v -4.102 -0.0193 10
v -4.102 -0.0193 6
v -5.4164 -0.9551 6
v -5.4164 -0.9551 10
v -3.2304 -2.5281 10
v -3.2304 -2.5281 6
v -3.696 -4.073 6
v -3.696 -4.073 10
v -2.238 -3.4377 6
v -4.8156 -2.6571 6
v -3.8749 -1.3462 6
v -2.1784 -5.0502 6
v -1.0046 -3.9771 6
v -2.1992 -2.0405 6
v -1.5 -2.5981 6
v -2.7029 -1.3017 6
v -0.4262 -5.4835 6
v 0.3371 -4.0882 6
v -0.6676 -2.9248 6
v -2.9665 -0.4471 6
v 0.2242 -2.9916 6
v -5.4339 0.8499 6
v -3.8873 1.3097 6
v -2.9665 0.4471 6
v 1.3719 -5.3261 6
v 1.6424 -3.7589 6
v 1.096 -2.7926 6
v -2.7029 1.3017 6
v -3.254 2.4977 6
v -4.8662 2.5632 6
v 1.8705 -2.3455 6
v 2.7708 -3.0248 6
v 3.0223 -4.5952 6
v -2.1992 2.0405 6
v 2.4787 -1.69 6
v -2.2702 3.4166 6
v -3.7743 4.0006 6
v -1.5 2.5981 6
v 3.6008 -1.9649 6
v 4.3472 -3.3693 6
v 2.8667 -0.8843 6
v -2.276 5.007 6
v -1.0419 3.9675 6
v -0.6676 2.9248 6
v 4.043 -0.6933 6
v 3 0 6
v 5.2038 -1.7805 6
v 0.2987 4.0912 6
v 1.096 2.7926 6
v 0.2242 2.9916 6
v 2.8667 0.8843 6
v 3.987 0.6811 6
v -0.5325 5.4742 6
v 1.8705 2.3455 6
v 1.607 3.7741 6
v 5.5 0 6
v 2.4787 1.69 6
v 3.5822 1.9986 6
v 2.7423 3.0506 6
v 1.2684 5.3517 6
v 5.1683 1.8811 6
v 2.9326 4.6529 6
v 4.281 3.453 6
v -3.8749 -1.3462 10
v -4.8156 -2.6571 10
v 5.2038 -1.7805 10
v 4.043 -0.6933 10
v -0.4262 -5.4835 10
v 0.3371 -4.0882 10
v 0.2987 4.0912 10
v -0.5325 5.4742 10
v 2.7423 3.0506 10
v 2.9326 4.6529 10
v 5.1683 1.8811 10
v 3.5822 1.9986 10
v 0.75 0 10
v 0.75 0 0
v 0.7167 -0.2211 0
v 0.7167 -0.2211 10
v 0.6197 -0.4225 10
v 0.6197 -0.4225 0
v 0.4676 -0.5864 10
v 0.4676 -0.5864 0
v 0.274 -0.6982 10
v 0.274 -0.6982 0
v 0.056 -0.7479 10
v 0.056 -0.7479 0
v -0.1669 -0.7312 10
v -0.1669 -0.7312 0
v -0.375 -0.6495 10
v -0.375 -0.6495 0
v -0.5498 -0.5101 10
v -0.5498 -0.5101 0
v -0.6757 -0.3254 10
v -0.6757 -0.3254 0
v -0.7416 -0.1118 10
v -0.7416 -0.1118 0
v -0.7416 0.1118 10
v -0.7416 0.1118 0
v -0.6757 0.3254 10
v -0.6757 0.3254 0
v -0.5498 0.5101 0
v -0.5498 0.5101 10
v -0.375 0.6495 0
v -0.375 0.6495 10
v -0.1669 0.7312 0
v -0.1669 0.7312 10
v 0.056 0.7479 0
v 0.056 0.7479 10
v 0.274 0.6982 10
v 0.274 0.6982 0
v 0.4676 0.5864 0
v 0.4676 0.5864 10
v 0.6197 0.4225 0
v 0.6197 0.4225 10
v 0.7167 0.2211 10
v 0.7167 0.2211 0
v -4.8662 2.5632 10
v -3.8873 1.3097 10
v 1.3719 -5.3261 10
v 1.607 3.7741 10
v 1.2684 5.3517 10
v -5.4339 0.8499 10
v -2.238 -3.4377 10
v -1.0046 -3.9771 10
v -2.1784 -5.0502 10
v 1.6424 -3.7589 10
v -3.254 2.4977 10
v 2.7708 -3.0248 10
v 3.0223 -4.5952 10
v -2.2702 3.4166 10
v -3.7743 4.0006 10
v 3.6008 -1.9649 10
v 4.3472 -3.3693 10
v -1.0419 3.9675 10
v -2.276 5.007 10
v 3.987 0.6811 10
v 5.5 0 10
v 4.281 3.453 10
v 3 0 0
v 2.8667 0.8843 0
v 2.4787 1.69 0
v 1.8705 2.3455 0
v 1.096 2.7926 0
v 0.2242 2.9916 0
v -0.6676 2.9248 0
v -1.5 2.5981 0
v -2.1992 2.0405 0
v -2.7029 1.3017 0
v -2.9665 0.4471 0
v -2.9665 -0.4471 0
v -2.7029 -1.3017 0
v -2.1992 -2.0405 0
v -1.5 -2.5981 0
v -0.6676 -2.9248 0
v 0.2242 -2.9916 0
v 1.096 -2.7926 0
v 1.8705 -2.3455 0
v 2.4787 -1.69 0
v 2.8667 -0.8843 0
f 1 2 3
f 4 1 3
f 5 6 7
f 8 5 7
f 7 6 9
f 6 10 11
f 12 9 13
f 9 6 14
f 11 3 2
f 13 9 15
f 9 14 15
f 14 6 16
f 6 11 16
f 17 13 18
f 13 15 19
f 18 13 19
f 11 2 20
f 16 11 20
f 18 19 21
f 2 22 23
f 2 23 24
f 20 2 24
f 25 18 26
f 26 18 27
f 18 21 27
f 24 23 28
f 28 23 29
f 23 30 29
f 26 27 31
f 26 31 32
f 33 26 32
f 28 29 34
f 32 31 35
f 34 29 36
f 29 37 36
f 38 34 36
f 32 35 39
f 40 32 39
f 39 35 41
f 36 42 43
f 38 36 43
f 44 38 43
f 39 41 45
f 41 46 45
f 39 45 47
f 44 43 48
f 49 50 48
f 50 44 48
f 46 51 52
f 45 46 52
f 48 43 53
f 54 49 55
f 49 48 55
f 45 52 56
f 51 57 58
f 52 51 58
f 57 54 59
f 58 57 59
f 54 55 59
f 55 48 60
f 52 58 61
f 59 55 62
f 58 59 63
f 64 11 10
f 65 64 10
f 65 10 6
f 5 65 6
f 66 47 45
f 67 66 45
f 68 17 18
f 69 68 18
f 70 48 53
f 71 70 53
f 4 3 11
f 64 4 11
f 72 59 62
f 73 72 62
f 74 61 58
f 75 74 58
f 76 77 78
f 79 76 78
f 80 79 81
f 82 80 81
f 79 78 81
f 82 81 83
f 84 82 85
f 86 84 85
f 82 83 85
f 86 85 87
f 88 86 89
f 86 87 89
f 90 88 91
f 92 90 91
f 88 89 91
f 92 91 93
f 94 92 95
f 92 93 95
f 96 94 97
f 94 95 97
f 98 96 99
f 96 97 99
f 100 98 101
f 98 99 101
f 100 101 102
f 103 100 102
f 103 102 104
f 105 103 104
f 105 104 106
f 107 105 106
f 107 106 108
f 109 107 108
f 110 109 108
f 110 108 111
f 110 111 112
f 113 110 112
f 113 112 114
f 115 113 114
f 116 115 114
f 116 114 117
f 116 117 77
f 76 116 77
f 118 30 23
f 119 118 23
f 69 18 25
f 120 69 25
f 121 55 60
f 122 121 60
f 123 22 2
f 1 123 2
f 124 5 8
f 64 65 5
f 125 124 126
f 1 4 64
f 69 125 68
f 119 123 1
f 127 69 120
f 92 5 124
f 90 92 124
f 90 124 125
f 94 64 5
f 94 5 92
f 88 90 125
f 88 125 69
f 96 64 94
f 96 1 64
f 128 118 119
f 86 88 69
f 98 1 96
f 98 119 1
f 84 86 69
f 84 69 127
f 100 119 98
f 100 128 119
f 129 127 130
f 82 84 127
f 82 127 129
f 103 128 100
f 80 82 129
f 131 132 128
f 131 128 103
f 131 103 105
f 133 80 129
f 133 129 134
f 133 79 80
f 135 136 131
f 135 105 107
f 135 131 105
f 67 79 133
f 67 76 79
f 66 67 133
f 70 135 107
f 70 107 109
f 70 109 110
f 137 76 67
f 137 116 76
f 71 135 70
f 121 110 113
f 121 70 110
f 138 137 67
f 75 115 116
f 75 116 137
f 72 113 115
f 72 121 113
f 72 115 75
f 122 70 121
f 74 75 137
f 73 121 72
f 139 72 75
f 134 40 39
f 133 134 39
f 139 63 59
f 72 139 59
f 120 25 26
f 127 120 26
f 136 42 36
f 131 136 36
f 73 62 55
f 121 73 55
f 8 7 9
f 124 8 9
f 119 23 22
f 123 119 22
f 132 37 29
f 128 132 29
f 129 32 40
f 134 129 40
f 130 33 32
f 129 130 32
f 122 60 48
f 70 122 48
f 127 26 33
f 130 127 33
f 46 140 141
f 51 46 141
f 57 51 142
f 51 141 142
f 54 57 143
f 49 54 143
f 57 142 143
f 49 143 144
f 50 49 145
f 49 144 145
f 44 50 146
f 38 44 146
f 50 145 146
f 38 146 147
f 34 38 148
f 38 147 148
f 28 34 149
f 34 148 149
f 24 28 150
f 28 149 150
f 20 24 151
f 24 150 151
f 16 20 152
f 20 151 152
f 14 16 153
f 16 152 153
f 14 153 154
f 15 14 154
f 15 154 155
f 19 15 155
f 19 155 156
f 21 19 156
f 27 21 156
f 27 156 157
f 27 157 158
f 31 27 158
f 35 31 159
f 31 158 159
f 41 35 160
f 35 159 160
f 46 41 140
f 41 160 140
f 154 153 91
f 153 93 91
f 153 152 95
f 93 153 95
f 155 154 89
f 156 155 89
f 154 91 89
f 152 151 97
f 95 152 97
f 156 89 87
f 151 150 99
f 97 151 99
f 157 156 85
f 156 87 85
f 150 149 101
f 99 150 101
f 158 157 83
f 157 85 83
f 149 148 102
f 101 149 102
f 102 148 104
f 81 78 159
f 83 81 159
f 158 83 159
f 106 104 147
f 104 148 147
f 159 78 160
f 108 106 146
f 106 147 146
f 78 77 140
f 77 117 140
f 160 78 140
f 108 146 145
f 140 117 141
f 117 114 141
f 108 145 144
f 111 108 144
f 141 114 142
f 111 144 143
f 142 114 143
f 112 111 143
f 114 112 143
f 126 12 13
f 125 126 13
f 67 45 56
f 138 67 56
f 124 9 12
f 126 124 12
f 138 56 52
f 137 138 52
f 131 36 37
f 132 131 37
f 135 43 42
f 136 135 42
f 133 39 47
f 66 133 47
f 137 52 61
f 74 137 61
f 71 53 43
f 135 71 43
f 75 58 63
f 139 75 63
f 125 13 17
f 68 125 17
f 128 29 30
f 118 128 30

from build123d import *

# Parameters (mm, degrees)
F0_R     = 3
F1_DEPTH = 6
F2_R     = 3
F3_DEPTH = 4
F4_R     = 0.75
F5_DEPTH = 25.4


with BuildPart() as f1:
    # F0 (on Top) → F1 (new body)
    with BuildSketch(Plane.XY):
        Circle(F0_R)
    extrude(amount=F1_DEPTH)

    # F2 (on face) → F3 (join)
    with BuildSketch(Plane.XY.offset(6)):
        Polygon((4.04302, -0.693343), (5.5, 0), (3.986969, 0.681121), (5.168309, 1.881111), (3.582234, 1.998583), (4.281007, 3.452967), (2.742315, 3.050646), (2.932624, 4.652925), (1.607039, 3.774144), (1.268387, 5.351747), (0.298678, 4.091152), (-0.53246, 5.474165), (-1.041851, 3.967528), (-2.275959, 5.006996), (-2.270169, 3.416587), (-3.774329, 4.000555), (-3.253981, 2.497667), (-4.86619, 2.563239), (-3.887328, 1.309739), (-5.433944, 0.849853), (-4.101995, -0.019253), (-5.416443, -0.955065), (-3.874862, -1.346171), (-4.81557, -2.657119), (-3.230392, -2.528102), (-3.696043, -4.072992), (-2.237997, -3.437747), (-2.178439, -5.050189), (-1.004562, -3.977133), (-0.426208, -5.483461), (0.337069, -4.088168), (1.371926, -5.326145), (1.642396, -3.758892), (3.022299, -4.595183), (2.770831, -3.024769), (4.34716, -3.369303), (3.600837, -1.964868), (5.203815, -1.780537), align=None)
        Circle(F2_R, mode=Mode.SUBTRACT)
        Circle(F2_R)
    extrude(amount=F3_DEPTH)

    # F4 (on face) → F5 (cut)
    with BuildSketch(Plane(origin=(0, 0, 0), x_dir=(1, 0, 0), z_dir=(0, 0, -1))):
        Circle(F4_R)
    extrude(amount=-F5_DEPTH, mode=Mode.SUBTRACT)


solid = f1.part
